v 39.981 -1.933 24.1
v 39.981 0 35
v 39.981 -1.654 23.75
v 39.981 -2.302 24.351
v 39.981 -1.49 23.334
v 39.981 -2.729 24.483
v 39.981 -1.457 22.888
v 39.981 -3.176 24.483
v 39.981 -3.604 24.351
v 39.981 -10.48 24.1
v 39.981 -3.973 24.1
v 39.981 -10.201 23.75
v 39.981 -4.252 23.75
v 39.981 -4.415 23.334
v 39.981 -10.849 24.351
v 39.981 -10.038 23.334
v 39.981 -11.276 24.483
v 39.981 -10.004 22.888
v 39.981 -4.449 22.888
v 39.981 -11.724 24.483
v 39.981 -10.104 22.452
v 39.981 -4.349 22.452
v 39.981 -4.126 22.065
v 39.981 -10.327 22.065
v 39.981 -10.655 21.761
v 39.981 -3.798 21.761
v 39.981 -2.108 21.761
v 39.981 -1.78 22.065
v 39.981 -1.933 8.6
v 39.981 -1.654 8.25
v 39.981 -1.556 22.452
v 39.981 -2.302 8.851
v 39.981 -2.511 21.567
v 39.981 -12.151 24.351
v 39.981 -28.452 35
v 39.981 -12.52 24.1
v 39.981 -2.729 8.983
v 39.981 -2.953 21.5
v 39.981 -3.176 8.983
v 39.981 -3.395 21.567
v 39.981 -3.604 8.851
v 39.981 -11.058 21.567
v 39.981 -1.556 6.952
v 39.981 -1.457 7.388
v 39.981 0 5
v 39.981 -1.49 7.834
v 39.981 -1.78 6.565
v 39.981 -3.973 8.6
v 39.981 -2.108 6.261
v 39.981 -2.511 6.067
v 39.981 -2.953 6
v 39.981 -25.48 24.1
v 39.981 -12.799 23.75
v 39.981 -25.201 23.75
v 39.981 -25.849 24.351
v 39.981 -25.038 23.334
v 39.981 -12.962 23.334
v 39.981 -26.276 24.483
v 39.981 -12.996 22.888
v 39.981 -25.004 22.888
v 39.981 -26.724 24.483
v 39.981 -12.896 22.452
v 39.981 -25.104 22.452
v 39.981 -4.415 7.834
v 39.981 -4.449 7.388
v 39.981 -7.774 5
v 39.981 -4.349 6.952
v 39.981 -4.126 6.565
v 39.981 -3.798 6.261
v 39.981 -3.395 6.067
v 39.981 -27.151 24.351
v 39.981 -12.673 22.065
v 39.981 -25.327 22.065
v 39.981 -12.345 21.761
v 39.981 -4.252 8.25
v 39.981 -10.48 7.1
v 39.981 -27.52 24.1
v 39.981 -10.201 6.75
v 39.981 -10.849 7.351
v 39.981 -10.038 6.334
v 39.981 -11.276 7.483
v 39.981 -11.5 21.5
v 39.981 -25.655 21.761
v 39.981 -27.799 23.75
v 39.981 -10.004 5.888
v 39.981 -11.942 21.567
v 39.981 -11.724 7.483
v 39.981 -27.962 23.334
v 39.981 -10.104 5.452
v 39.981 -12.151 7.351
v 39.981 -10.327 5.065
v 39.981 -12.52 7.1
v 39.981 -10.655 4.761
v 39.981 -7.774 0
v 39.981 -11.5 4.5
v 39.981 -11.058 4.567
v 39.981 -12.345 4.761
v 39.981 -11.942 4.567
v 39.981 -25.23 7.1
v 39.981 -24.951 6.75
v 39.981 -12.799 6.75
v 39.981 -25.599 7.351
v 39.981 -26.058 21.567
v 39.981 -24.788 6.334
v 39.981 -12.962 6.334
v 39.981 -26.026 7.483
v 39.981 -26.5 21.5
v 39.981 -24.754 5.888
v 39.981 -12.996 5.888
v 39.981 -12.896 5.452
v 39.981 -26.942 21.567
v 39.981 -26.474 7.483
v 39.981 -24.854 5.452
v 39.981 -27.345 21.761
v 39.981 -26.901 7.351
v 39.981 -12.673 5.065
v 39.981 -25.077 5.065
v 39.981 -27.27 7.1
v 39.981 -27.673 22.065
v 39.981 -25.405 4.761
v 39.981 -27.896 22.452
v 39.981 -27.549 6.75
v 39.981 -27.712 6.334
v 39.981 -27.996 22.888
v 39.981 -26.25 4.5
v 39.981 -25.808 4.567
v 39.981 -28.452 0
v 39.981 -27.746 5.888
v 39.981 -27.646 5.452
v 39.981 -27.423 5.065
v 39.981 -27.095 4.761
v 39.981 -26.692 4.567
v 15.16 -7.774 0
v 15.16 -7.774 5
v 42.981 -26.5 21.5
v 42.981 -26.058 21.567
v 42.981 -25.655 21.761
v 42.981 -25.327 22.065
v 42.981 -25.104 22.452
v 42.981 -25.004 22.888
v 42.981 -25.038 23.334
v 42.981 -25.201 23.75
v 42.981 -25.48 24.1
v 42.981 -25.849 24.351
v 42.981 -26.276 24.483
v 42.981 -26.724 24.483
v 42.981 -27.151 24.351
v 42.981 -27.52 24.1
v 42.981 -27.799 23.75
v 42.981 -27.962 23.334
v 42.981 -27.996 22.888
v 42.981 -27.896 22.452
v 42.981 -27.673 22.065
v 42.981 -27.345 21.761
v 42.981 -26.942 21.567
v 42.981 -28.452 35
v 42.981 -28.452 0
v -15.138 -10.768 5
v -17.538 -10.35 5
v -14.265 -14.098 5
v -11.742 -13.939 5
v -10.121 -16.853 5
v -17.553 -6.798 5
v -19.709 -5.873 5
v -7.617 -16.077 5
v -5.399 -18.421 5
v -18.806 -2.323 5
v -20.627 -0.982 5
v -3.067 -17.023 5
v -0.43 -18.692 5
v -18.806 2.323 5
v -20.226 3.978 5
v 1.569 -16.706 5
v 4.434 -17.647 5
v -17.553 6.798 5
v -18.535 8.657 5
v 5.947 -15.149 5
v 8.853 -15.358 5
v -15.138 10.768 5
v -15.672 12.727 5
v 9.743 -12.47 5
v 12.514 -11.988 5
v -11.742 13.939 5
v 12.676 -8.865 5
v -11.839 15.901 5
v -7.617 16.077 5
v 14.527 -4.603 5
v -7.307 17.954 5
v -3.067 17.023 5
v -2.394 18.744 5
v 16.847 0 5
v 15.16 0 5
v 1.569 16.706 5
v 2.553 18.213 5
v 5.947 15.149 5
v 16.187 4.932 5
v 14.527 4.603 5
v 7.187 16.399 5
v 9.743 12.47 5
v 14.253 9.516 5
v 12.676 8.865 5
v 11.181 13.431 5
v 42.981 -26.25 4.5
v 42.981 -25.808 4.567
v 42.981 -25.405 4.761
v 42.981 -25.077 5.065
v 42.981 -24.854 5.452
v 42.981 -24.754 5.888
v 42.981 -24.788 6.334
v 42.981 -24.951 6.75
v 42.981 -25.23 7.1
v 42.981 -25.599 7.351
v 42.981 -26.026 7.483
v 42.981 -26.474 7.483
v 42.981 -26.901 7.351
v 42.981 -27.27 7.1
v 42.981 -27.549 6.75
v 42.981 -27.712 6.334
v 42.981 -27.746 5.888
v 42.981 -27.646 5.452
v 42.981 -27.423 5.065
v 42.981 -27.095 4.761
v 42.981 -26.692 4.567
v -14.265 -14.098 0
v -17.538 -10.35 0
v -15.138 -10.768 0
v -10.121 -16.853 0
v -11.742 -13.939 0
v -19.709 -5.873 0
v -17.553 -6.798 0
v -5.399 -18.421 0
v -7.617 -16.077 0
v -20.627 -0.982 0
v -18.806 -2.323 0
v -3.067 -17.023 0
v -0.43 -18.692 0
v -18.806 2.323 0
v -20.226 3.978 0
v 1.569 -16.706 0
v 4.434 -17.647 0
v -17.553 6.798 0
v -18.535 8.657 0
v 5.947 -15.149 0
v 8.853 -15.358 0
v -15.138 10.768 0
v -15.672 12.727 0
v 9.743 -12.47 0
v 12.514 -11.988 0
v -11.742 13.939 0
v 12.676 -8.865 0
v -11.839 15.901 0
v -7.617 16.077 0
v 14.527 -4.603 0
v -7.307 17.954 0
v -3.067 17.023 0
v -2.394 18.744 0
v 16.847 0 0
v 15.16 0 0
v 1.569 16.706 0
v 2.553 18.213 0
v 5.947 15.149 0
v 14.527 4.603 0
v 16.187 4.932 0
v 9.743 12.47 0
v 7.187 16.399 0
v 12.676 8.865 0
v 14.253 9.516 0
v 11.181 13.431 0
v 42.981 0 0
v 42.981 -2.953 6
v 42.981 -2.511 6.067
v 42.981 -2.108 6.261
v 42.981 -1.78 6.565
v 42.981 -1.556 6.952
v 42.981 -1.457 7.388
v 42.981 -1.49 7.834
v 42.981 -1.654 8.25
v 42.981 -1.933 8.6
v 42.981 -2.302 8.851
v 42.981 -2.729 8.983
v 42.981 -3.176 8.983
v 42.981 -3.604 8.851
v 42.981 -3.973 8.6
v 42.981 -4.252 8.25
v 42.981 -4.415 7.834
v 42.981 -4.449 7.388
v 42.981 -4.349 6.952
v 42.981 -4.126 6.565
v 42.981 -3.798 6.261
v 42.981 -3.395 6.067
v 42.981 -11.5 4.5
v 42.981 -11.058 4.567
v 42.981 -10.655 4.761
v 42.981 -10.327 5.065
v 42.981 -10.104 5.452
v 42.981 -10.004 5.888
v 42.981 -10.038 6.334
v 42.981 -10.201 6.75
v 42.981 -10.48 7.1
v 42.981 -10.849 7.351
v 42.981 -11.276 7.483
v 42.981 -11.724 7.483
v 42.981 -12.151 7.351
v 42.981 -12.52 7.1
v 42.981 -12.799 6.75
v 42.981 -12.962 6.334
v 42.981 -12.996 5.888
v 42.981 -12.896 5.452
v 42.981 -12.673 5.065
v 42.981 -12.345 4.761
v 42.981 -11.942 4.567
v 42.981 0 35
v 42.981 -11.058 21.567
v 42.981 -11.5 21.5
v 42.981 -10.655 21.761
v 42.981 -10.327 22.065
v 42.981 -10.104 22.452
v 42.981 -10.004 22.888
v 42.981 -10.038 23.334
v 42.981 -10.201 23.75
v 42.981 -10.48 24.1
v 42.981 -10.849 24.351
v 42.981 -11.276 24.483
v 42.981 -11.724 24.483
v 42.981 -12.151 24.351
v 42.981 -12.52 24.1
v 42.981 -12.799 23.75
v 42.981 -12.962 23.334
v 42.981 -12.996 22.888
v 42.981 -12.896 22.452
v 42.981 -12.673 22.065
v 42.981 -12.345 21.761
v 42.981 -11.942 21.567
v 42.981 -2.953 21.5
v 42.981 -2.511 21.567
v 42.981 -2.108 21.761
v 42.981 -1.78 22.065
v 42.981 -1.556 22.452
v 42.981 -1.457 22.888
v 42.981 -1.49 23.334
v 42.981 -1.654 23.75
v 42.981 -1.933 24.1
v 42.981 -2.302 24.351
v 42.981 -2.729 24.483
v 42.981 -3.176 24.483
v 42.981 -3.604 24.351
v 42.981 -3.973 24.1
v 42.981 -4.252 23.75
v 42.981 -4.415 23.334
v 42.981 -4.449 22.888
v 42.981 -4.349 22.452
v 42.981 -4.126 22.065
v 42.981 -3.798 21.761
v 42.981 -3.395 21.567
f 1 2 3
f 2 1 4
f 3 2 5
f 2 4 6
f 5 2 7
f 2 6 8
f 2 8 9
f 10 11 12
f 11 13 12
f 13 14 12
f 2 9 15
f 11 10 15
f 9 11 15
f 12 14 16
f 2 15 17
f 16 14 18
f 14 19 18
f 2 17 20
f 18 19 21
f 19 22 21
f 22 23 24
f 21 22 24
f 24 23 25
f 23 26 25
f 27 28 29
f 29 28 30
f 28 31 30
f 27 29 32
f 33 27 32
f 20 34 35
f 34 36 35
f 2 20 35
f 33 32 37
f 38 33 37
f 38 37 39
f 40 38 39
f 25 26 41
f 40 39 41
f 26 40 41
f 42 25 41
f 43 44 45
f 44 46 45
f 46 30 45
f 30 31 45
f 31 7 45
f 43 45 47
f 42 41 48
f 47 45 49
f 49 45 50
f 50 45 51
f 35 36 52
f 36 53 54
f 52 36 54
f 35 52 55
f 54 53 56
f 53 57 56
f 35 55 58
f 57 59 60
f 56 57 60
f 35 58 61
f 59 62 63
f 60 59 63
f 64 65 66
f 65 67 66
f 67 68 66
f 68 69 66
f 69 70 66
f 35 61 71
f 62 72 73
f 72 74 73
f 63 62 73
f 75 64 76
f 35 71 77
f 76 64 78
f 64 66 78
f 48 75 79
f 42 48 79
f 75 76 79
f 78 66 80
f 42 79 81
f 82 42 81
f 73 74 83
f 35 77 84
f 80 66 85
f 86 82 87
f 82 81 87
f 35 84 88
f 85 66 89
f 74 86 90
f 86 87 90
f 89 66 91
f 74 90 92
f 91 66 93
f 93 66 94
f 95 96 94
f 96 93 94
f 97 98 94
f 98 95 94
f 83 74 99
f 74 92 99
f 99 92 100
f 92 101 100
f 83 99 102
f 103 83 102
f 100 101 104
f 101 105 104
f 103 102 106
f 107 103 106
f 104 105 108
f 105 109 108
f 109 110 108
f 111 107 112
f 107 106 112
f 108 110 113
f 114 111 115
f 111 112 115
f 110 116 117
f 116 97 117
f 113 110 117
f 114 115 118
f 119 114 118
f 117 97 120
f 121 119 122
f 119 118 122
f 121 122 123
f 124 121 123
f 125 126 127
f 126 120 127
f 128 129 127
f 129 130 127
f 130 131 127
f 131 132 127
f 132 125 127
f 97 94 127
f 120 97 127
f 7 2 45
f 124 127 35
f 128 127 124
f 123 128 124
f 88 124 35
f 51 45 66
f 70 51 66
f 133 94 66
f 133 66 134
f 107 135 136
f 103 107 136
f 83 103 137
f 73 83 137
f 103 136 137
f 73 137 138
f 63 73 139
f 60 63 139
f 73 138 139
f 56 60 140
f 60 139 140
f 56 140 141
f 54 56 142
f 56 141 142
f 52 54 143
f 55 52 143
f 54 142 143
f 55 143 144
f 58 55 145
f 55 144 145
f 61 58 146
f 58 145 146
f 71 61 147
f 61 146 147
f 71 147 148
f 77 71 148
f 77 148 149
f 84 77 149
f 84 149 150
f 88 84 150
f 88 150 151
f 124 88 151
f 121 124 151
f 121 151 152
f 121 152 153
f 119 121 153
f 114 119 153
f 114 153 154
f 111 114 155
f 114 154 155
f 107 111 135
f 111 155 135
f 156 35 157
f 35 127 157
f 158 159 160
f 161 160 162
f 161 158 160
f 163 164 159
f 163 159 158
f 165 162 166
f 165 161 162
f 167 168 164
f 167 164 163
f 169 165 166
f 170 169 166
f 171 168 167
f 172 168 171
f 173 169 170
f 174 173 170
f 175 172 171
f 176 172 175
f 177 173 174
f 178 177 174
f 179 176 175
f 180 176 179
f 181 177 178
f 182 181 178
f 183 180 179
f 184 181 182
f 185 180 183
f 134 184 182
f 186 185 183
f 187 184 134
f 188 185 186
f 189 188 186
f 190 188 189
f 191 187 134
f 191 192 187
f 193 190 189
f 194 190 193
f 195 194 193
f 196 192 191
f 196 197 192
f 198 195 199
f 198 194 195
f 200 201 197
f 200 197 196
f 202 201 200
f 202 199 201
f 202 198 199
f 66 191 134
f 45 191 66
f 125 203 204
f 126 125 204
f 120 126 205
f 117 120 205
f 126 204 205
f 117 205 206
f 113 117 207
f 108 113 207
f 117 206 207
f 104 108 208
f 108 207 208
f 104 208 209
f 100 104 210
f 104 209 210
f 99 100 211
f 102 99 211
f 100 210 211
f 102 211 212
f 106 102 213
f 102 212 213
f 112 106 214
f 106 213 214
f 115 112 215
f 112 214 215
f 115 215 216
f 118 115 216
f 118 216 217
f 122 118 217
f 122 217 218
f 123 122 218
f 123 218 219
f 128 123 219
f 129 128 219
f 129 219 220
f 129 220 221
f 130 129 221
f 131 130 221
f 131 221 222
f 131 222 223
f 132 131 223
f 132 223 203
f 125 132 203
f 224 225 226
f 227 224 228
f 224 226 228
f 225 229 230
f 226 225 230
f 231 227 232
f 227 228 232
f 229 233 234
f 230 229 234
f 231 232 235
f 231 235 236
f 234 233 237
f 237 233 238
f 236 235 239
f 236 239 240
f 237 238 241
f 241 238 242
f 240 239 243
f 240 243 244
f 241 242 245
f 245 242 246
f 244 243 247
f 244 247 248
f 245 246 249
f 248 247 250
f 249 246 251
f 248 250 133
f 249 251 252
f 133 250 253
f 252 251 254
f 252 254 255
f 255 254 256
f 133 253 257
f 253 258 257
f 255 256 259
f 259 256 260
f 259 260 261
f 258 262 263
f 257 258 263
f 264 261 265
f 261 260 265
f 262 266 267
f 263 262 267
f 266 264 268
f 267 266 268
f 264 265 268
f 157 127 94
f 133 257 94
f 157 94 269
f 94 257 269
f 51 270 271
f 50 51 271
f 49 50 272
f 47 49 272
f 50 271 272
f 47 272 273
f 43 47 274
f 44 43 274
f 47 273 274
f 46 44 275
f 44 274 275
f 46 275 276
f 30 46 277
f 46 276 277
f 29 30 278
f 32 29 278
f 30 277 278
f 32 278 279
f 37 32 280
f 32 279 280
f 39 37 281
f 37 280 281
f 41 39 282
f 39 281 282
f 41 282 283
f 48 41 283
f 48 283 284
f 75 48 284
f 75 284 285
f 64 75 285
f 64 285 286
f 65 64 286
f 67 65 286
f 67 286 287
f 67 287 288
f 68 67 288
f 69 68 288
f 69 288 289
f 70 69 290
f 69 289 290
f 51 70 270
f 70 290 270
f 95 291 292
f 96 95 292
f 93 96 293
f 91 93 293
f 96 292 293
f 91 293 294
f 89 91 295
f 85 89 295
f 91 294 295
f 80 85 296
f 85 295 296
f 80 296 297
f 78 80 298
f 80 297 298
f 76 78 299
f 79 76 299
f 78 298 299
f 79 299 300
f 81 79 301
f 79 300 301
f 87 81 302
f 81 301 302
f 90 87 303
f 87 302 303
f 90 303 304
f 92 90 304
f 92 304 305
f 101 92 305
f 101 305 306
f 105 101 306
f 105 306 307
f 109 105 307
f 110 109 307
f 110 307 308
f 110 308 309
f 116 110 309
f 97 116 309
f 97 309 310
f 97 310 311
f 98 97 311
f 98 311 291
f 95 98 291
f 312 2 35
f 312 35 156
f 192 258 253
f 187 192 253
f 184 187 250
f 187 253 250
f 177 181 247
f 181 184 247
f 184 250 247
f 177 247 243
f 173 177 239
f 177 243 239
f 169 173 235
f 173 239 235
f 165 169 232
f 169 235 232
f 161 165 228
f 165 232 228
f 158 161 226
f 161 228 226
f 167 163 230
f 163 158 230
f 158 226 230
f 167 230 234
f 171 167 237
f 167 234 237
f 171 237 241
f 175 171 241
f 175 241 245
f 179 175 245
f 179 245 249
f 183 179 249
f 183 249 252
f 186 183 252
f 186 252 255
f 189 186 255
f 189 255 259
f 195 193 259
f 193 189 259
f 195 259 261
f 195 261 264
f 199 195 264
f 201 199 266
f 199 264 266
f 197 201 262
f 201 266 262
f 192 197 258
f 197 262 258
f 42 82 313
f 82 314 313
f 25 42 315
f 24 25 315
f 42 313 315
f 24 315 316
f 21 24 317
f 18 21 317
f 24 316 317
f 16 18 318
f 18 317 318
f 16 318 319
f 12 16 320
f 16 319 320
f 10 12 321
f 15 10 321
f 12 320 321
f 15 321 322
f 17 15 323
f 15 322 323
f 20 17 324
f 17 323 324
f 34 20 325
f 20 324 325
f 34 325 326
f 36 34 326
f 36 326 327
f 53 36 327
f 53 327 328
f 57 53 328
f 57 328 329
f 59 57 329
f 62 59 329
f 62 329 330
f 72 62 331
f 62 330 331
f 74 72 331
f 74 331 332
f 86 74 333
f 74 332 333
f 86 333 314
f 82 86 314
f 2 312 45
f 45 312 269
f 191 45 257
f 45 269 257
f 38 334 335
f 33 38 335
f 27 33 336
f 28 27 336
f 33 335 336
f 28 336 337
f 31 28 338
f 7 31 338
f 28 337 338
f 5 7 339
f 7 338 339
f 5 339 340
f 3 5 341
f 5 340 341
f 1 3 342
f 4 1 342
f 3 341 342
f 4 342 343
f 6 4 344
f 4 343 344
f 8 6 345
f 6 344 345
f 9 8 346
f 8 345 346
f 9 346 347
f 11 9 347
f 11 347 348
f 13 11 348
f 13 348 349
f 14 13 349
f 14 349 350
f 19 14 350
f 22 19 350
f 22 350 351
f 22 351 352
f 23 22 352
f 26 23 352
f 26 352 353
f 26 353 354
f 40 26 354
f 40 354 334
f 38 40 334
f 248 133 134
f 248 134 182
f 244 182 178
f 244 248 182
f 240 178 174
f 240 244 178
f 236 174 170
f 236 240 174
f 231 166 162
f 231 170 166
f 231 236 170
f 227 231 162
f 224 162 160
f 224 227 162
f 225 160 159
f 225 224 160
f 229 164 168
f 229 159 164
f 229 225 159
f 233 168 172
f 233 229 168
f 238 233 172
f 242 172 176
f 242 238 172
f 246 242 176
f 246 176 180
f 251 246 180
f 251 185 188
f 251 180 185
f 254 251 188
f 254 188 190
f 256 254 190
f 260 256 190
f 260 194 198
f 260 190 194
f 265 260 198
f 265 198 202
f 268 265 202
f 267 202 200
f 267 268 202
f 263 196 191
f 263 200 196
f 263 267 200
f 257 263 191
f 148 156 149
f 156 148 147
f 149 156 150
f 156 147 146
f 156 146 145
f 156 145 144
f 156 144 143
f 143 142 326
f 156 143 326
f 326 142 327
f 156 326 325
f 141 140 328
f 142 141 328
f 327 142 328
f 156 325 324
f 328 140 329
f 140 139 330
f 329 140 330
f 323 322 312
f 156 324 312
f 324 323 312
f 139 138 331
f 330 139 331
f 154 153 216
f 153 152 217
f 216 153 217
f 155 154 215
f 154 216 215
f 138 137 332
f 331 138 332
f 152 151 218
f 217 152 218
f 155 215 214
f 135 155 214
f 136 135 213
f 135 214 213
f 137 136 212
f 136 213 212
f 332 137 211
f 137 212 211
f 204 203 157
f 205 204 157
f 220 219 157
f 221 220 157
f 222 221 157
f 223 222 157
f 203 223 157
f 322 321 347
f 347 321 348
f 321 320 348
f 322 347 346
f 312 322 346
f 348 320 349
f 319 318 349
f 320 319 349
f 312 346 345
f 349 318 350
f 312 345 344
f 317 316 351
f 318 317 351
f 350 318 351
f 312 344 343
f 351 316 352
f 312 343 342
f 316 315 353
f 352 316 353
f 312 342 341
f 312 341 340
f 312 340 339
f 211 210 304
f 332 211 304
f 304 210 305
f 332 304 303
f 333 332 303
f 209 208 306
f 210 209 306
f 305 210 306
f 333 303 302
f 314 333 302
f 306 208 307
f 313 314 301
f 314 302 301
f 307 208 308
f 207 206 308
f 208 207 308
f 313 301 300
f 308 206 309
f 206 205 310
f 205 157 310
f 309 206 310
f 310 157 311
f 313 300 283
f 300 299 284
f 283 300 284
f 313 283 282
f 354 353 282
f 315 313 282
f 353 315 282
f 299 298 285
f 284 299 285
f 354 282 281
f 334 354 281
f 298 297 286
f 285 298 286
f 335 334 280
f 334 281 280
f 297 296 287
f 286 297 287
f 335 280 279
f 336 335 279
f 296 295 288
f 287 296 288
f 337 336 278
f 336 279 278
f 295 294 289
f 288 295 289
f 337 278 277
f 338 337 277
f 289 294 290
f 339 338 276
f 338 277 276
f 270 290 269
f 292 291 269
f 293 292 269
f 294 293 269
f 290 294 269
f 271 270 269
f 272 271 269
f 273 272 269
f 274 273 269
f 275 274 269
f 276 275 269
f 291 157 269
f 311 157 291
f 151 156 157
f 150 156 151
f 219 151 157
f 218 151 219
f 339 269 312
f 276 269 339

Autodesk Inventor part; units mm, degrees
ref_plane "YZ Plane" through (0, 0, 0) normal (1, 0, 0) x (0, 1, 0)
ref_plane "XZ Plane" through (0, 0, 0) normal (0, 1, 0) x (-1, 0, 0)
ref_plane "Arbeitsebene1" through (0, 0, 0) normal (0, 0, 1) x (1, 0, 0)
sketch "Skizze1" plane through (0, 0, 0) normal (0, 0, 1) x (1, 0, 0)
  circle A0 centre (-1.9028, 0) radius 18.75 projected
  circle A1 centre (-1.9028, 0) radius 16.25 projected
  line L0 (31.75, -9) -> (39.5, -9) projected
  line L1 (39.5, -9) -> (39.5, -29) projected
  circle A2 centre (-1.9028, 0) radius 17.0624
  line L2 (39.9814, -7.7741) -> (15.1596, -7.7741)
  line L3 (15.1596, -7.7741) -> (15.1596, 0)
  line L4 (15.1596, 0) -> (39.9814, 0)
  line L5 (39.9814, 0) -> (39.9814, -7.7741)
  line L6 (39.9814, 0) -> (42.9814, 0)
  line L7 (42.9814, 0) -> (42.9814, -28.4525)
  line L8 (42.9814, -28.4525) -> (39.9814, -28.4525)
  line L9 (39.9814, -28.4525) -> (39.9814, 0)
  point P0 (0, 0)
  dimension "d0" = 3
extrude "Extrusion1" add sketch "Skizze1" along normal blind 5 contours L4 L3 A0 | L4 L5 L2 A0 | A0 L3 L4 | L6 L7 L8 L9 L5
sketch "Skizze2" plane through (0, 0, 5) normal (0, 0, 1) x (1, 0, 0)
  arc A0 (16.8472, 0) -> (15.1596, -7.7741) centre (-1.9028, 0) ccw projected
  line L0 (15.1596, -7.7741) -> (39.9814, -7.7741) projected
  line L1 (39.9814, -7.7741) -> (39.9814, -28.4525) projected
  line L2 (39.9814, -28.4525) -> (42.9814, -28.4525) projected
  line L3 (42.9814, -28.4525) -> (42.9814, 0) projected
  line L4 (42.9814, 0) -> (16.8472, 0) projected
  circle A1 centre (-1.9028, 0) radius 17.0624 projected
  line L5 (42.9814, 0) -> (39.9814, 0)
  line L6 (39.9814, 0) -> (39.9814, -28.4525)
  line L7 (39.9814, -28.4525) -> (42.9814, -28.4525)
  line L8 (42.9814, -28.4525) -> (42.9814, 0)
  point P0 (0, 0)
ref_plane "Arbeitsebene2" through (31.75, -29, 35) normal (0, 0, 1) x (1, 0, 0)
extrude "Extrusion2" add sketch "Skizze2" along normal up to surface (30 mm away) contours L4 L3 L2 L1 L6
sketch "Skizze3" plane through (42.9814, -28.4525, 0) normal (1, 0, 0) x (0, 0, -1)
  line L0 (-35, 13.9525) -> (6, 13.9525) projected
  line L1 (-35, 13.9525) -> (6, 13.9525) projected
  circle A0 centre (-6, 16.9525) radius 1.5 projected
  circle A1 centre (-23, 16.9525) radius 1.5 projected
  circle A2 centre (-6, 2.2025) radius 1.5 projected
  circle A3 centre (-23, 1.9525) radius 1.5 projected
  circle A4 centre (-23, 25.4997) radius 1.5
  circle A5 centre (-7.5, 25.4997) radius 1.5
  point P0 (0, 28.4525)
  dimension "d7" = 3
  dimension "d8" = 3
extrude "Extrusion3" cut sketch "Skizze3" against normal blind 5
properties part number "16_Gabel"
